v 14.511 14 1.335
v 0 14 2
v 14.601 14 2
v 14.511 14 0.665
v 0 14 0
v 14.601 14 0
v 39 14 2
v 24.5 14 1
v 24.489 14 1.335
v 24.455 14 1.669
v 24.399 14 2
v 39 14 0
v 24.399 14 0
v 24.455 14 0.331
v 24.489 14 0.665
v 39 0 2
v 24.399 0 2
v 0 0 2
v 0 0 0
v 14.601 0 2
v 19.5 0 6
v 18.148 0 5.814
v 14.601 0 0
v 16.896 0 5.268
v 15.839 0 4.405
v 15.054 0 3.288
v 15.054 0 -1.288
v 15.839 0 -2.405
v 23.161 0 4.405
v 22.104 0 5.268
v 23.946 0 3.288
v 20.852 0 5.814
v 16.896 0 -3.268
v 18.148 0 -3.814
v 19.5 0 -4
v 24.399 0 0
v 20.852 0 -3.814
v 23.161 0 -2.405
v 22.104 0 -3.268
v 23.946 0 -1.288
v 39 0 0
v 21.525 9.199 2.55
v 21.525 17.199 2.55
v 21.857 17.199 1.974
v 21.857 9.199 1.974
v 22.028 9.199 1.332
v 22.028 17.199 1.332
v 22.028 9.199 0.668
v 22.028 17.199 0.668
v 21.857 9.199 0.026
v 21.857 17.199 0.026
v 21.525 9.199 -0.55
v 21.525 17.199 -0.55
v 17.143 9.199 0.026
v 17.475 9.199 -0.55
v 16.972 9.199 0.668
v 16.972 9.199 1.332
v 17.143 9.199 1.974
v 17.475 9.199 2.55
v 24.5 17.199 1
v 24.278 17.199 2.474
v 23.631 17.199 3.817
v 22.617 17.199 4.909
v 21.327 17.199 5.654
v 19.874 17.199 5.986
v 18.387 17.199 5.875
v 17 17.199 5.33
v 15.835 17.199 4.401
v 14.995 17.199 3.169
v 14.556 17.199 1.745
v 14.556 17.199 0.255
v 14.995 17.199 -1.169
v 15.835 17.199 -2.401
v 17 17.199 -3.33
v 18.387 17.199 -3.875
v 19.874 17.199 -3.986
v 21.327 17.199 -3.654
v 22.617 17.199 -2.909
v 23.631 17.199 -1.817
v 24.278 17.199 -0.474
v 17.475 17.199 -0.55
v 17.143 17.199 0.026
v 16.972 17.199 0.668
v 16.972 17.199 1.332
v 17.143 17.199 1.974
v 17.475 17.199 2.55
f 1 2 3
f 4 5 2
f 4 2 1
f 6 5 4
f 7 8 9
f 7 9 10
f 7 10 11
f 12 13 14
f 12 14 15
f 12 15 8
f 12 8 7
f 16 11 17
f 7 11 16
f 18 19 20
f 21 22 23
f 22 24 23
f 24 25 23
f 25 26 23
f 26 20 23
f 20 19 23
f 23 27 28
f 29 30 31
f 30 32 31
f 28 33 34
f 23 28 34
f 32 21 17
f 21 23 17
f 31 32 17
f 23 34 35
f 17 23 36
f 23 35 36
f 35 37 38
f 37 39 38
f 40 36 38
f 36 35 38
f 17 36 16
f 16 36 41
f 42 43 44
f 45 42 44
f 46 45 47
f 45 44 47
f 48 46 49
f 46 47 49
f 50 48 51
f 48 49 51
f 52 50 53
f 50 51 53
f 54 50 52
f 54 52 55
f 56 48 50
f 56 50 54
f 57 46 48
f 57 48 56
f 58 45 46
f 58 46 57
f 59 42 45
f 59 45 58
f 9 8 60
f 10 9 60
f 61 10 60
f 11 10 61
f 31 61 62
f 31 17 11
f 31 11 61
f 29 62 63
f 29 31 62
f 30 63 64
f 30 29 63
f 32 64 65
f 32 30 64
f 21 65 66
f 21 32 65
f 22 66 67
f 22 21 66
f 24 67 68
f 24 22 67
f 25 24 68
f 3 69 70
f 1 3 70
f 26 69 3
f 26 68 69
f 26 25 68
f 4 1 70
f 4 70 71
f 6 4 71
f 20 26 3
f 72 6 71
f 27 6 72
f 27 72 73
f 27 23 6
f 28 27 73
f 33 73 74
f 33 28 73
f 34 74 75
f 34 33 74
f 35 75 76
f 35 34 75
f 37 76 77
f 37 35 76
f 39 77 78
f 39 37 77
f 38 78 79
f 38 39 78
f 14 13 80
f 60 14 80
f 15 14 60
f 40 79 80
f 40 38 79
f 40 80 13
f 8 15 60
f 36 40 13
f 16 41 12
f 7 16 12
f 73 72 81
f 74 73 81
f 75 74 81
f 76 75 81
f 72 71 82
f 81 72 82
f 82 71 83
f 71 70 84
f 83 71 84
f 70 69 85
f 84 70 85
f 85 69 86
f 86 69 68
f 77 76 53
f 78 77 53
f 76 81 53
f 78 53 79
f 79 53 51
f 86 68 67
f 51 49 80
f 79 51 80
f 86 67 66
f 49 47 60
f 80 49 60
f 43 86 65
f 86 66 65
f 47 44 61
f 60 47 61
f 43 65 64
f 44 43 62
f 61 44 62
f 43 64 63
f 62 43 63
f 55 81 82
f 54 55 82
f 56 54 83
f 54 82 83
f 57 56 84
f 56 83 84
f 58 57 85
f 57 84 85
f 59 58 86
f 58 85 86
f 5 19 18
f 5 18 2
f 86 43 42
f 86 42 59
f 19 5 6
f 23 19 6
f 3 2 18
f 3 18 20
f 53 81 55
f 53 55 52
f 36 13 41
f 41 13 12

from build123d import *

# Parameters (mm, degrees)
SKETCH_W     = 39
SKETCH_H     = 14
PAD_DEPTH    = 2
SKETCH001_R  = 5
PAD001_DEPTH = 17.199
POCKET_DEPTH = 8


with BuildPart() as part:
    # Sketch → Pad (new body)
    with BuildSketch(Plane.XY):
        with Locations((19.5, 7)):
            Rectangle(SKETCH_W, SKETCH_H)
    extrude(amount=PAD_DEPTH)

    # Sketch001 (on Face1 of Pad) → Pad001 (join)
    with BuildSketch(Plane.XZ):
        with Locations((19.5, 1)):
            Circle(SKETCH001_R)
    extrude(amount=-PAD001_DEPTH)

    # Sketch002 (on Face14 of Pad001) → Pocket (cut)
    with BuildSketch(Plane(origin=(0, 17.199, 0), x_dir=(-1, 0, 0), z_dir=(0, 1, 0))):
        with BuildLine():
            ThreePointArc((-21.524846, 2.55), (-22.05, 1), (-21.524846, -0.55))
            Line((-17.475154, -0.55), (-21.524846, -0.55))
            ThreePointArc((-17.475154, -0.55), (-16.95, 1), (-17.475154, 2.55))
            Line((-21.524846, 2.55), (-17.475154, 2.55))
        make_face()
    extrude(amount=-POCKET_DEPTH, mode=Mode.SUBTRACT)


solid = part.part
